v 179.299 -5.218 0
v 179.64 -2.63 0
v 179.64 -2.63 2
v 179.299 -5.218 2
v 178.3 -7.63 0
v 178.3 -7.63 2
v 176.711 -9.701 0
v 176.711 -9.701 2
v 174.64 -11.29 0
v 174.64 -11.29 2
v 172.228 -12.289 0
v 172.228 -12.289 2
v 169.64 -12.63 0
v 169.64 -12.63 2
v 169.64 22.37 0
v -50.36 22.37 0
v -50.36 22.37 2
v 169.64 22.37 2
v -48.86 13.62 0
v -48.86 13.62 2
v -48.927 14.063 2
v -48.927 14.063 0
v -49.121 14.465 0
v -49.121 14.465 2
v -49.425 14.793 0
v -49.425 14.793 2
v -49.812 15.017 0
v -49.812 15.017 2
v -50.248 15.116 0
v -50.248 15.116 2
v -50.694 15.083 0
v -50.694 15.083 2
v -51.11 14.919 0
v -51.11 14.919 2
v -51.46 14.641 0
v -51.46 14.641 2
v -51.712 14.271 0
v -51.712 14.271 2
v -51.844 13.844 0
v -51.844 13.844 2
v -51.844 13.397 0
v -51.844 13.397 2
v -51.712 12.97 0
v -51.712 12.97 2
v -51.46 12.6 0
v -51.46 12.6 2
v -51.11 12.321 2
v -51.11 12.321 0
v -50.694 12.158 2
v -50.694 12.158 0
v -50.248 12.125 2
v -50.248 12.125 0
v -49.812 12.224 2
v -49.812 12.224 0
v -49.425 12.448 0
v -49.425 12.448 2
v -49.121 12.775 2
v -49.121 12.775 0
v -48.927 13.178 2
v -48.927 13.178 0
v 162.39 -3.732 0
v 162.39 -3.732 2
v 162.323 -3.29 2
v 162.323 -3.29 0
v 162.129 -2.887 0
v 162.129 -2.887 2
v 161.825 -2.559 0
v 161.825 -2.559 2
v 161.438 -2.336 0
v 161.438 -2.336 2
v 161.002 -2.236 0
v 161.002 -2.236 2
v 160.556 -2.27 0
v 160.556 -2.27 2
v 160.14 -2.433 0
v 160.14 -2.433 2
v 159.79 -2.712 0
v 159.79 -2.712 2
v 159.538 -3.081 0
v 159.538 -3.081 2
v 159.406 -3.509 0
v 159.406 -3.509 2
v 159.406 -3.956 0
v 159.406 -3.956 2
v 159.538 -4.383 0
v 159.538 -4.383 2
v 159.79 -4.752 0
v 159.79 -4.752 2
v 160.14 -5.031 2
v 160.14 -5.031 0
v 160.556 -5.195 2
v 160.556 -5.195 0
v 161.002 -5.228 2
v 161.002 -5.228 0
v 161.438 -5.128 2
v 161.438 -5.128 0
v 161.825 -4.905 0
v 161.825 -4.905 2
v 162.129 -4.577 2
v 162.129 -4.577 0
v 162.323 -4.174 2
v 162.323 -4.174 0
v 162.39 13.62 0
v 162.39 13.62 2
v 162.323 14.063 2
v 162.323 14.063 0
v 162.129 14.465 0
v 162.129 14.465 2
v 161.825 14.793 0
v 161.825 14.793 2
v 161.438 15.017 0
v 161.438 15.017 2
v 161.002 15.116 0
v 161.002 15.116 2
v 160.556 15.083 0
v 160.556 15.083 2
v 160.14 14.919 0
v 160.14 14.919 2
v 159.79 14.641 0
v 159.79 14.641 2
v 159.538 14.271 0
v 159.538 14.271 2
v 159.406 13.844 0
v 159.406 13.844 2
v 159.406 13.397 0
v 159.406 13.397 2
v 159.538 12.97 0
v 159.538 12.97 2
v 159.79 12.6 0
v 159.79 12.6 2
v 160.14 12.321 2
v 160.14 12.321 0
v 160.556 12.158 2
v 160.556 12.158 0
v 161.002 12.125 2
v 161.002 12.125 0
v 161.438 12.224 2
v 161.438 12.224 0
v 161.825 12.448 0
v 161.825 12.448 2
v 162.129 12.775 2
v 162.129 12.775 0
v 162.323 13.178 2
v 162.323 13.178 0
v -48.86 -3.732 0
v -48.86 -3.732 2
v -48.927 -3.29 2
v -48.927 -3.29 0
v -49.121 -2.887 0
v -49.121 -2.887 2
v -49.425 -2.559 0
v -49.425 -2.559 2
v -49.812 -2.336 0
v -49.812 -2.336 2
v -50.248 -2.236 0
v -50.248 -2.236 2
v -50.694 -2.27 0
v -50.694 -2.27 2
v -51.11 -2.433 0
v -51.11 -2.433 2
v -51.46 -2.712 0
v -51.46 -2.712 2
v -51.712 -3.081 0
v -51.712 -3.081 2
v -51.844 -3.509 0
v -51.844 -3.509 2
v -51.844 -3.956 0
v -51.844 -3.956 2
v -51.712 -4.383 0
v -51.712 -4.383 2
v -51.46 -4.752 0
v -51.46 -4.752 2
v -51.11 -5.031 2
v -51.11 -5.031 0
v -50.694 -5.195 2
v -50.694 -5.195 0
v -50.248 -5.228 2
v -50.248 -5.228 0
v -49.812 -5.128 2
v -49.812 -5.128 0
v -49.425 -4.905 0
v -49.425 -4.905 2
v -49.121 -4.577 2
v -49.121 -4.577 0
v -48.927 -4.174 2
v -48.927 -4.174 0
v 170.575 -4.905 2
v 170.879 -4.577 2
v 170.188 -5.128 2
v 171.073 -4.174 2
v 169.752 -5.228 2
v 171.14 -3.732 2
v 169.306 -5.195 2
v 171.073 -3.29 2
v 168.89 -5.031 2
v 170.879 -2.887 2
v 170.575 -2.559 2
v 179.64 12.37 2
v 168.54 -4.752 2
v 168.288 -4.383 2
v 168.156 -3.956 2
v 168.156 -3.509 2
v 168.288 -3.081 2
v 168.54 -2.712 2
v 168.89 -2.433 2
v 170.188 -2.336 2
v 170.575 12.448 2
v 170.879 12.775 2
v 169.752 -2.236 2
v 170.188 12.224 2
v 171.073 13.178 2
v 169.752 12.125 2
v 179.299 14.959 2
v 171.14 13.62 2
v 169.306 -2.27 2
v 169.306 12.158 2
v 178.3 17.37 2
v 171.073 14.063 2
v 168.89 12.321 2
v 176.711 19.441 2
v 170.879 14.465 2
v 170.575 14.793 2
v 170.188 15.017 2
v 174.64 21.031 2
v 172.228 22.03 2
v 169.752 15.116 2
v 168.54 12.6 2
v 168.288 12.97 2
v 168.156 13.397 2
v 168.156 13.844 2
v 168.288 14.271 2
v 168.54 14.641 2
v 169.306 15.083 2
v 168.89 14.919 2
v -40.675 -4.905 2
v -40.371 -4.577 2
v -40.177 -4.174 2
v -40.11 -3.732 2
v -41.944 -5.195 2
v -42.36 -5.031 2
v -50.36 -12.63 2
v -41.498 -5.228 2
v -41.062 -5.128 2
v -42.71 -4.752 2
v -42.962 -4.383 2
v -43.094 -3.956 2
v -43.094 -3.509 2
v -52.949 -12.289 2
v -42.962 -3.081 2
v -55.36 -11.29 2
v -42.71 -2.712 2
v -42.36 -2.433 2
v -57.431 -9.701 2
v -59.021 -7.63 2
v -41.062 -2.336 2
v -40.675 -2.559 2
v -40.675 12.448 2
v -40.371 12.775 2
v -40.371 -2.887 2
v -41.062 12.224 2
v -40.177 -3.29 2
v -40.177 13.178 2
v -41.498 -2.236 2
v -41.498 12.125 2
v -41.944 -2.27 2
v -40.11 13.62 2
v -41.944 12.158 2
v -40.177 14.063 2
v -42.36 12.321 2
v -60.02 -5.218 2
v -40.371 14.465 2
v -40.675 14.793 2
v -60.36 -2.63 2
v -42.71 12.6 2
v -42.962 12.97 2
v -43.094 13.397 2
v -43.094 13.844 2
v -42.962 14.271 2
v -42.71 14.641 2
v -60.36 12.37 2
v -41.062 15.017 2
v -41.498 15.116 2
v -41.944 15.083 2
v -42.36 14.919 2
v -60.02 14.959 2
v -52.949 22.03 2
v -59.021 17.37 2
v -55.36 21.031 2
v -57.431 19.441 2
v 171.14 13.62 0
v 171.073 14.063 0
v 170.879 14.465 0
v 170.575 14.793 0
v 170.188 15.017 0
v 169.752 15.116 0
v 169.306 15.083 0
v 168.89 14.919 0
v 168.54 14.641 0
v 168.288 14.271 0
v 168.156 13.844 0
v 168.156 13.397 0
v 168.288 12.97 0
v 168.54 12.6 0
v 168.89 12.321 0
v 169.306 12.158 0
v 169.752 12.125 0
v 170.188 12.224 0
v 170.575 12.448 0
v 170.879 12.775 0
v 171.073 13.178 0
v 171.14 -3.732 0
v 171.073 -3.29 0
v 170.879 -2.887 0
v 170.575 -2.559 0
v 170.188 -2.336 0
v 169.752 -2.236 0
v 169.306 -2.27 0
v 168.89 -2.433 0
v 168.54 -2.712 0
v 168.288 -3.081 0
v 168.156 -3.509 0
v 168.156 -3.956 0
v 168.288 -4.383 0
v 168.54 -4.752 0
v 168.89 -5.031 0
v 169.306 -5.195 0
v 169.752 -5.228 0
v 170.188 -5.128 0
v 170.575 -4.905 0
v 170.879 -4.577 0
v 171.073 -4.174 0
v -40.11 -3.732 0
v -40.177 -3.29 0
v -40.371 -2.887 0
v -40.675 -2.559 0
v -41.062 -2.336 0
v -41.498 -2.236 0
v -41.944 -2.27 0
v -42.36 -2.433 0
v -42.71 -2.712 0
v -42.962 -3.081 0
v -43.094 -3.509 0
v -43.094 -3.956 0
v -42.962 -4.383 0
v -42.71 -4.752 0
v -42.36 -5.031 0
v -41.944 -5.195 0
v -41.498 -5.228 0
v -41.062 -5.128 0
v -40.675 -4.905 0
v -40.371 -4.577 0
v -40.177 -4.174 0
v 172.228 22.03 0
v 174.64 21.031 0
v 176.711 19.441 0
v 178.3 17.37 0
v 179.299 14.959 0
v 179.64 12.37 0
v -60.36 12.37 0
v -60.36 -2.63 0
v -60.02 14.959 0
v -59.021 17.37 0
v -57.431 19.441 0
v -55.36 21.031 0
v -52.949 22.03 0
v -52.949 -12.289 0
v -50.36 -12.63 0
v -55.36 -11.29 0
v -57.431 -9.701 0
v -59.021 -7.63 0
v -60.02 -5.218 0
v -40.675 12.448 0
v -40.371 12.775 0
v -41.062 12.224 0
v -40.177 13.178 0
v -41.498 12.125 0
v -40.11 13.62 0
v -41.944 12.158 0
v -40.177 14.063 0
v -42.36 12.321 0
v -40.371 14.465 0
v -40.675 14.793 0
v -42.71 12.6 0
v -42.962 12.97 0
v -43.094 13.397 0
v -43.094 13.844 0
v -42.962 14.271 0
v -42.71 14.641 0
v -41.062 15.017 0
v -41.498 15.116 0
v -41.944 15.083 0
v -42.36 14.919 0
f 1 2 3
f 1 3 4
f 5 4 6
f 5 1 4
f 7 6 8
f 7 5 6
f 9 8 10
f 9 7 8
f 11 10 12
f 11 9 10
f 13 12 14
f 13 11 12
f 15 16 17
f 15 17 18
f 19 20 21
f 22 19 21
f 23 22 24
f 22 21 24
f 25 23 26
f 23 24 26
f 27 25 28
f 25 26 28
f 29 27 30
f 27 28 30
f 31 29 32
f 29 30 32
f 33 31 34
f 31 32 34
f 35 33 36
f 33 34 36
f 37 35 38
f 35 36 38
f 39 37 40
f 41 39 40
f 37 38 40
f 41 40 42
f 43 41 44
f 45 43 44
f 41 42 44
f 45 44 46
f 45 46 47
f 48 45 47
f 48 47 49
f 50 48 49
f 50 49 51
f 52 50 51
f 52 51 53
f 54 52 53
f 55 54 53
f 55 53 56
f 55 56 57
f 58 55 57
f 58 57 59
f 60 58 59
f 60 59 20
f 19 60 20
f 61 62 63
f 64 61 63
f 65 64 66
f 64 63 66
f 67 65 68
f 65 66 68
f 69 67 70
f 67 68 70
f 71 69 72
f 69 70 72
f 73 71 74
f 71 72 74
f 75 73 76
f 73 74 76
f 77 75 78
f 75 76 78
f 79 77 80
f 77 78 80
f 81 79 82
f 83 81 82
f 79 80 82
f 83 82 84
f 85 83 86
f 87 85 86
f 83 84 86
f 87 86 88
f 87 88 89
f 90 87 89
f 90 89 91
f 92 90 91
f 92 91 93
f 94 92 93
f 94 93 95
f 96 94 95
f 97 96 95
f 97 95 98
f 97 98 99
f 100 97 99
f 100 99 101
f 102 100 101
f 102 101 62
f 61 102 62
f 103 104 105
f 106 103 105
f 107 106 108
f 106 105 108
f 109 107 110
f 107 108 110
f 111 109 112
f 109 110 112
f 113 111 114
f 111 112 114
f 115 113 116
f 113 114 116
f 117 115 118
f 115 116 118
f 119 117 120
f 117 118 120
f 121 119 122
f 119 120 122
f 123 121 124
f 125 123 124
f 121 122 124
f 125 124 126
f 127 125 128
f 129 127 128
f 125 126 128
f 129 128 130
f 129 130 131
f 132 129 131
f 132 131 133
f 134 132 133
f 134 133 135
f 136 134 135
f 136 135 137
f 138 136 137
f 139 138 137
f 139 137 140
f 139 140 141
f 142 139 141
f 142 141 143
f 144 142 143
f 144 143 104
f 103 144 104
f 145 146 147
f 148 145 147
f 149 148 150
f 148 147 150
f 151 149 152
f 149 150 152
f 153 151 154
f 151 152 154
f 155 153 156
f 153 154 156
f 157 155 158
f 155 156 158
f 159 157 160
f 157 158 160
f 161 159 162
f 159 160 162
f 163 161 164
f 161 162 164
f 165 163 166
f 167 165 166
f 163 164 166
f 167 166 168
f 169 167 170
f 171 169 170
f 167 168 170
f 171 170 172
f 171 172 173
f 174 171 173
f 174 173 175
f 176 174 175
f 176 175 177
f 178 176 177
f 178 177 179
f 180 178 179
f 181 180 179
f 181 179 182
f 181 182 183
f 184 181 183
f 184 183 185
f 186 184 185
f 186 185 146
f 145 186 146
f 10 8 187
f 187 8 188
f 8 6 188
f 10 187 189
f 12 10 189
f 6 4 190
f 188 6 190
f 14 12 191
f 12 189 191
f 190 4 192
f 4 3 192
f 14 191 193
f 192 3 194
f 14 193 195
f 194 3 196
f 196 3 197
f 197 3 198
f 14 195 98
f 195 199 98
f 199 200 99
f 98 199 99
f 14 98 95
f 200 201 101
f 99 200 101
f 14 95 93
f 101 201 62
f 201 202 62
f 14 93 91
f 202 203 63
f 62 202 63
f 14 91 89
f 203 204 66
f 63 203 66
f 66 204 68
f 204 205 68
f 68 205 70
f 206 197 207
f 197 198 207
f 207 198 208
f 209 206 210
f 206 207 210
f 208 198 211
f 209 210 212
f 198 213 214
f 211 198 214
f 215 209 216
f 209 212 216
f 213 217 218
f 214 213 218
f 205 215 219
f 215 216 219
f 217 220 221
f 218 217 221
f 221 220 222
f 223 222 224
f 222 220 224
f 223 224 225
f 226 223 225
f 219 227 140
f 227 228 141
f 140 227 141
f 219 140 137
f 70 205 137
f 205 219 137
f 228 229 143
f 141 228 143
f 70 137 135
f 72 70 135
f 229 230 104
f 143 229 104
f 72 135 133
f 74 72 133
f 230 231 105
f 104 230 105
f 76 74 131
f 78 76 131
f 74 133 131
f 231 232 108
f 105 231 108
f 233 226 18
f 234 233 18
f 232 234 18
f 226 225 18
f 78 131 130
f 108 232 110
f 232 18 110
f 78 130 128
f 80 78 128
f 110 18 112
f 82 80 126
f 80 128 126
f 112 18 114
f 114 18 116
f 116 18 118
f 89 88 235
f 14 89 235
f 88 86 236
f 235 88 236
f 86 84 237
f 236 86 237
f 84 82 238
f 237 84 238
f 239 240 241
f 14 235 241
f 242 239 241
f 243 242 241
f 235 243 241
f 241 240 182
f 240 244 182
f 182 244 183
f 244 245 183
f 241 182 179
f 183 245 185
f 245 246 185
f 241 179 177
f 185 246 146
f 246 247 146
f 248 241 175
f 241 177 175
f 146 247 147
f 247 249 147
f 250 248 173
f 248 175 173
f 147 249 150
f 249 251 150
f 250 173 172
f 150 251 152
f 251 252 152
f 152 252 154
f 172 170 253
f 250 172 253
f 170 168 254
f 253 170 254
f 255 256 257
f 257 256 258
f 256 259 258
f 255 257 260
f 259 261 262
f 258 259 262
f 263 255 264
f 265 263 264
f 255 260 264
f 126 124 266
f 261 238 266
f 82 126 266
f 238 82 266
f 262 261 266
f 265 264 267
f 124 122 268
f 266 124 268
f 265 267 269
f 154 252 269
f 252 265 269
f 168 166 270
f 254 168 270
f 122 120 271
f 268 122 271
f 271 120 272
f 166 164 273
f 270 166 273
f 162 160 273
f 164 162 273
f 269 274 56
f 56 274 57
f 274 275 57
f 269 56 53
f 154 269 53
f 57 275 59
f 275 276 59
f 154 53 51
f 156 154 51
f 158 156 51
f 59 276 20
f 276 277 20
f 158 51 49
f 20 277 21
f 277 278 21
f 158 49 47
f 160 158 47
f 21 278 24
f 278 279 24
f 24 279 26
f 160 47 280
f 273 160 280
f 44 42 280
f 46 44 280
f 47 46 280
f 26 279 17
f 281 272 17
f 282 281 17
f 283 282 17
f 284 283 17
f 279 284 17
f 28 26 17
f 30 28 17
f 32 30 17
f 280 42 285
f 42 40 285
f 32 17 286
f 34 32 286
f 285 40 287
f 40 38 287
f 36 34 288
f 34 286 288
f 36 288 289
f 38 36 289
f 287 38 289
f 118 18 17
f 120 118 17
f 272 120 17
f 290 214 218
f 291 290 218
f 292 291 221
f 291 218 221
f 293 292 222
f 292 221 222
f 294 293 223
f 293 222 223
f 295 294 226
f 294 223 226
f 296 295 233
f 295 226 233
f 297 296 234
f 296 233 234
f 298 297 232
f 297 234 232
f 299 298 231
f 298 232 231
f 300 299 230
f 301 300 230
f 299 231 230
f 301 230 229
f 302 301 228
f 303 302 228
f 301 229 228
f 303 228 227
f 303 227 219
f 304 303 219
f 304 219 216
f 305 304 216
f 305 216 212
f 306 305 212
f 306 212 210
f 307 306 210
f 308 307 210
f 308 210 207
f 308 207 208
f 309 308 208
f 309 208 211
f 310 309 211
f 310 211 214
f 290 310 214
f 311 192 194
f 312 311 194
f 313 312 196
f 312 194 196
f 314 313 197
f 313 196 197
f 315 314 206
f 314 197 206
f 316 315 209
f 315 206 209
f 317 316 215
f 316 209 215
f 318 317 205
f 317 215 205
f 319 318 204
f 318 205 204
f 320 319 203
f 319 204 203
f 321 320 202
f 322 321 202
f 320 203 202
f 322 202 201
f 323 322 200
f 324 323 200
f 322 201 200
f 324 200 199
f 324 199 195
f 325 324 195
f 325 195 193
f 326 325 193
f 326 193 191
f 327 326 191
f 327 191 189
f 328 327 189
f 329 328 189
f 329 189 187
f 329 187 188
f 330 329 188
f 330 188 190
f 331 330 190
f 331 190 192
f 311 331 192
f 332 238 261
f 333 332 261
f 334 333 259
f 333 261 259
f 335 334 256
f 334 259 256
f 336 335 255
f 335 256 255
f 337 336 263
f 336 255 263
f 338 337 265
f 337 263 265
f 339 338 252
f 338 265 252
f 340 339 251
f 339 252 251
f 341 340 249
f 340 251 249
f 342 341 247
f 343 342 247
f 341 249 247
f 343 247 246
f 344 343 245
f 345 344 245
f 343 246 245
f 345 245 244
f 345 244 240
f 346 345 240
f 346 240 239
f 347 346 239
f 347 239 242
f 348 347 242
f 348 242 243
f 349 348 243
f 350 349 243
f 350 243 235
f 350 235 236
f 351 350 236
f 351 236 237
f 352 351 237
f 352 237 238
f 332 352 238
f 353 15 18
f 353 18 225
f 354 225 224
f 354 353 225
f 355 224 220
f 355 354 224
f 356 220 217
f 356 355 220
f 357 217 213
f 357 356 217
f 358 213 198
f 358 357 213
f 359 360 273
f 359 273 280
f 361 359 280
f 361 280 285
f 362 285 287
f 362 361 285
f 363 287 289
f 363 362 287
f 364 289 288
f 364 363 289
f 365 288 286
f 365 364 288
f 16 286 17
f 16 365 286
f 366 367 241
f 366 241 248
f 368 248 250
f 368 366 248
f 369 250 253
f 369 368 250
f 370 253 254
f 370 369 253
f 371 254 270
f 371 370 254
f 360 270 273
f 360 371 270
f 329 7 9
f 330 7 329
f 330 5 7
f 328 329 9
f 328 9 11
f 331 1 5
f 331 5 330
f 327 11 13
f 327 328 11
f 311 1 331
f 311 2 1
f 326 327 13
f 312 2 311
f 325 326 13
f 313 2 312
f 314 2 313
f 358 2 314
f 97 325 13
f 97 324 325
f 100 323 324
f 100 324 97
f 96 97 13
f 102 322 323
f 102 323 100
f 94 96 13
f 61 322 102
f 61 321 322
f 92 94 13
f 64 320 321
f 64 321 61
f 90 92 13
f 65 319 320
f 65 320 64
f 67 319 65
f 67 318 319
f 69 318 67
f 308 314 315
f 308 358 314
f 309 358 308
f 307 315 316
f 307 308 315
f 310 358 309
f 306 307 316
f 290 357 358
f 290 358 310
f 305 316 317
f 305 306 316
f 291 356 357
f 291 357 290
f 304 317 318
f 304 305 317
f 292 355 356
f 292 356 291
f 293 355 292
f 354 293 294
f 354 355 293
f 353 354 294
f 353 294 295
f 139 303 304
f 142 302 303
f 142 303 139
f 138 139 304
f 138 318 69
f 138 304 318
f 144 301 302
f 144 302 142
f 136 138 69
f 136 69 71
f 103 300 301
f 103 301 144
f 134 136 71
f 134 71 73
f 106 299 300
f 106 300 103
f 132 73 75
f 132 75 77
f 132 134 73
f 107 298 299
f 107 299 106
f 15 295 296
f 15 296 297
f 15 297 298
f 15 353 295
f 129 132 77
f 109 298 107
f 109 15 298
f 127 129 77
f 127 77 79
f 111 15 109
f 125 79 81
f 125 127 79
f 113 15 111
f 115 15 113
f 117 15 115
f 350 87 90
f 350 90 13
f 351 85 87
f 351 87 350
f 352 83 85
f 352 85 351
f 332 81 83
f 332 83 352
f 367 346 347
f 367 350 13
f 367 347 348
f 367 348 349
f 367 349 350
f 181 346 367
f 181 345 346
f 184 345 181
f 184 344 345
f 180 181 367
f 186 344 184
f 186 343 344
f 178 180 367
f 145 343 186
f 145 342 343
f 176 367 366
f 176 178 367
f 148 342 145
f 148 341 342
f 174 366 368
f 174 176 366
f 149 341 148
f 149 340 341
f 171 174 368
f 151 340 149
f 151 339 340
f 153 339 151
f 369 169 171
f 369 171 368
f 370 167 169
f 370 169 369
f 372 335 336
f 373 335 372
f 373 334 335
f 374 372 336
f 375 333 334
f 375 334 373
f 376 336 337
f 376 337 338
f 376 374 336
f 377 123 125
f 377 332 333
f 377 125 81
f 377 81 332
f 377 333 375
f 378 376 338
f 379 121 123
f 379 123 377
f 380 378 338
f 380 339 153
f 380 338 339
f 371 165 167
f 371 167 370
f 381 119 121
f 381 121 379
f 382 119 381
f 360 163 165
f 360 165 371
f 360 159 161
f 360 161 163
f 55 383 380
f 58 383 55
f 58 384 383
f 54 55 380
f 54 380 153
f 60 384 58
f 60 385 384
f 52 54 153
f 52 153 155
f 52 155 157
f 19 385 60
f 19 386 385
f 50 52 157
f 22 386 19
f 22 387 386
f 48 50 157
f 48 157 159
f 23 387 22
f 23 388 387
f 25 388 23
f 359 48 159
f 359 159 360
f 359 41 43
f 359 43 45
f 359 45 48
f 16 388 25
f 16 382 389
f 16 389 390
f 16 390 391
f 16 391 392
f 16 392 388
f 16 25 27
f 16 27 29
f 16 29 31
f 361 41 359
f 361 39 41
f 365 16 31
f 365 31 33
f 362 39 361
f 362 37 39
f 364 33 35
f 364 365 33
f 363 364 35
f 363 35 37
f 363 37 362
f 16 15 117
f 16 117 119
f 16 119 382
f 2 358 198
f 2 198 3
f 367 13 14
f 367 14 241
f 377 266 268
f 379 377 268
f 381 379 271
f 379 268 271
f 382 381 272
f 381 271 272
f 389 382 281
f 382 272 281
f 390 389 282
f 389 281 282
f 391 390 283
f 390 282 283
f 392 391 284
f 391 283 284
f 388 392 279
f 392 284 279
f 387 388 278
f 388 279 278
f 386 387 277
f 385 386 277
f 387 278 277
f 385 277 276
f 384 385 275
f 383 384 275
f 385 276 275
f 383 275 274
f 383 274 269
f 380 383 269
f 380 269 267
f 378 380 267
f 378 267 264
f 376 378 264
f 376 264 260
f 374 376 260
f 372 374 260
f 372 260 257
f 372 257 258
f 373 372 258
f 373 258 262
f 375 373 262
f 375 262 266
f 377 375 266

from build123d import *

# Parameters (mm, degrees)
EXTRUDE_1_DEPTH = 2
MM_2_D          = 3
MM_3_D          = 3


with BuildPart() as part:
    # 草图2 → 凸台-拉伸1 (new body)
    with BuildSketch(Plane.XY):
        with BuildLine():
            Line((-50.360367403, 22.370399323), (169.639632597, 22.370399323))
            ThreePointArc((169.639632597, 22.370399323), (176.710700409, 19.441467134), (179.639632597, 12.370399323))
            Line((179.639632597, 12.370399323), (179.639632597, -2.629600677))
            ThreePointArc((179.639632597, -2.629600677), (176.710700409, -9.700668489), (169.639632597, -12.629600677))
            Line((169.639632597, -12.629600677), (-50.360367403, -12.629600677))
            ThreePointArc((-50.360367403, -12.629600677), (-57.431435215, -9.700668489), (-60.360367403, -2.629600677))
            Line((-60.360367403, -2.629600677), (-60.360367403, 12.370399323))
            ThreePointArc((-60.360367403, 12.370399323), (-57.431435215, 19.441467134), (-50.360367403, 22.370399323))
        make_face()
    extrude(amount=EXTRUDE_1_DEPTH)

    # 大小mm 暗销孔2 (through all)
    with Locations(Plane(origin=(-41.610367403, 13.620399323, 0), x_dir=(-1, 0, 0), z_dir=(0, 0, -1))):
        with Locations((0, 0), (8.75, 0), (0, -17.352577314), (8.75, -17.352577314)):
            Hole(MM_2_D / 2)

    # 大小mm 暗销孔3 (through all)
    with Locations(Plane(origin=(169.639632597, 13.620399323, 0), x_dir=(-1, 0, 0), z_dir=(0, 0, -1))):
        with Locations((0, 0), (8.75, 0), (8.75, -17.352577314), (0, -17.352577314)):
            Hole(MM_3_D / 2)


solid = part.part
